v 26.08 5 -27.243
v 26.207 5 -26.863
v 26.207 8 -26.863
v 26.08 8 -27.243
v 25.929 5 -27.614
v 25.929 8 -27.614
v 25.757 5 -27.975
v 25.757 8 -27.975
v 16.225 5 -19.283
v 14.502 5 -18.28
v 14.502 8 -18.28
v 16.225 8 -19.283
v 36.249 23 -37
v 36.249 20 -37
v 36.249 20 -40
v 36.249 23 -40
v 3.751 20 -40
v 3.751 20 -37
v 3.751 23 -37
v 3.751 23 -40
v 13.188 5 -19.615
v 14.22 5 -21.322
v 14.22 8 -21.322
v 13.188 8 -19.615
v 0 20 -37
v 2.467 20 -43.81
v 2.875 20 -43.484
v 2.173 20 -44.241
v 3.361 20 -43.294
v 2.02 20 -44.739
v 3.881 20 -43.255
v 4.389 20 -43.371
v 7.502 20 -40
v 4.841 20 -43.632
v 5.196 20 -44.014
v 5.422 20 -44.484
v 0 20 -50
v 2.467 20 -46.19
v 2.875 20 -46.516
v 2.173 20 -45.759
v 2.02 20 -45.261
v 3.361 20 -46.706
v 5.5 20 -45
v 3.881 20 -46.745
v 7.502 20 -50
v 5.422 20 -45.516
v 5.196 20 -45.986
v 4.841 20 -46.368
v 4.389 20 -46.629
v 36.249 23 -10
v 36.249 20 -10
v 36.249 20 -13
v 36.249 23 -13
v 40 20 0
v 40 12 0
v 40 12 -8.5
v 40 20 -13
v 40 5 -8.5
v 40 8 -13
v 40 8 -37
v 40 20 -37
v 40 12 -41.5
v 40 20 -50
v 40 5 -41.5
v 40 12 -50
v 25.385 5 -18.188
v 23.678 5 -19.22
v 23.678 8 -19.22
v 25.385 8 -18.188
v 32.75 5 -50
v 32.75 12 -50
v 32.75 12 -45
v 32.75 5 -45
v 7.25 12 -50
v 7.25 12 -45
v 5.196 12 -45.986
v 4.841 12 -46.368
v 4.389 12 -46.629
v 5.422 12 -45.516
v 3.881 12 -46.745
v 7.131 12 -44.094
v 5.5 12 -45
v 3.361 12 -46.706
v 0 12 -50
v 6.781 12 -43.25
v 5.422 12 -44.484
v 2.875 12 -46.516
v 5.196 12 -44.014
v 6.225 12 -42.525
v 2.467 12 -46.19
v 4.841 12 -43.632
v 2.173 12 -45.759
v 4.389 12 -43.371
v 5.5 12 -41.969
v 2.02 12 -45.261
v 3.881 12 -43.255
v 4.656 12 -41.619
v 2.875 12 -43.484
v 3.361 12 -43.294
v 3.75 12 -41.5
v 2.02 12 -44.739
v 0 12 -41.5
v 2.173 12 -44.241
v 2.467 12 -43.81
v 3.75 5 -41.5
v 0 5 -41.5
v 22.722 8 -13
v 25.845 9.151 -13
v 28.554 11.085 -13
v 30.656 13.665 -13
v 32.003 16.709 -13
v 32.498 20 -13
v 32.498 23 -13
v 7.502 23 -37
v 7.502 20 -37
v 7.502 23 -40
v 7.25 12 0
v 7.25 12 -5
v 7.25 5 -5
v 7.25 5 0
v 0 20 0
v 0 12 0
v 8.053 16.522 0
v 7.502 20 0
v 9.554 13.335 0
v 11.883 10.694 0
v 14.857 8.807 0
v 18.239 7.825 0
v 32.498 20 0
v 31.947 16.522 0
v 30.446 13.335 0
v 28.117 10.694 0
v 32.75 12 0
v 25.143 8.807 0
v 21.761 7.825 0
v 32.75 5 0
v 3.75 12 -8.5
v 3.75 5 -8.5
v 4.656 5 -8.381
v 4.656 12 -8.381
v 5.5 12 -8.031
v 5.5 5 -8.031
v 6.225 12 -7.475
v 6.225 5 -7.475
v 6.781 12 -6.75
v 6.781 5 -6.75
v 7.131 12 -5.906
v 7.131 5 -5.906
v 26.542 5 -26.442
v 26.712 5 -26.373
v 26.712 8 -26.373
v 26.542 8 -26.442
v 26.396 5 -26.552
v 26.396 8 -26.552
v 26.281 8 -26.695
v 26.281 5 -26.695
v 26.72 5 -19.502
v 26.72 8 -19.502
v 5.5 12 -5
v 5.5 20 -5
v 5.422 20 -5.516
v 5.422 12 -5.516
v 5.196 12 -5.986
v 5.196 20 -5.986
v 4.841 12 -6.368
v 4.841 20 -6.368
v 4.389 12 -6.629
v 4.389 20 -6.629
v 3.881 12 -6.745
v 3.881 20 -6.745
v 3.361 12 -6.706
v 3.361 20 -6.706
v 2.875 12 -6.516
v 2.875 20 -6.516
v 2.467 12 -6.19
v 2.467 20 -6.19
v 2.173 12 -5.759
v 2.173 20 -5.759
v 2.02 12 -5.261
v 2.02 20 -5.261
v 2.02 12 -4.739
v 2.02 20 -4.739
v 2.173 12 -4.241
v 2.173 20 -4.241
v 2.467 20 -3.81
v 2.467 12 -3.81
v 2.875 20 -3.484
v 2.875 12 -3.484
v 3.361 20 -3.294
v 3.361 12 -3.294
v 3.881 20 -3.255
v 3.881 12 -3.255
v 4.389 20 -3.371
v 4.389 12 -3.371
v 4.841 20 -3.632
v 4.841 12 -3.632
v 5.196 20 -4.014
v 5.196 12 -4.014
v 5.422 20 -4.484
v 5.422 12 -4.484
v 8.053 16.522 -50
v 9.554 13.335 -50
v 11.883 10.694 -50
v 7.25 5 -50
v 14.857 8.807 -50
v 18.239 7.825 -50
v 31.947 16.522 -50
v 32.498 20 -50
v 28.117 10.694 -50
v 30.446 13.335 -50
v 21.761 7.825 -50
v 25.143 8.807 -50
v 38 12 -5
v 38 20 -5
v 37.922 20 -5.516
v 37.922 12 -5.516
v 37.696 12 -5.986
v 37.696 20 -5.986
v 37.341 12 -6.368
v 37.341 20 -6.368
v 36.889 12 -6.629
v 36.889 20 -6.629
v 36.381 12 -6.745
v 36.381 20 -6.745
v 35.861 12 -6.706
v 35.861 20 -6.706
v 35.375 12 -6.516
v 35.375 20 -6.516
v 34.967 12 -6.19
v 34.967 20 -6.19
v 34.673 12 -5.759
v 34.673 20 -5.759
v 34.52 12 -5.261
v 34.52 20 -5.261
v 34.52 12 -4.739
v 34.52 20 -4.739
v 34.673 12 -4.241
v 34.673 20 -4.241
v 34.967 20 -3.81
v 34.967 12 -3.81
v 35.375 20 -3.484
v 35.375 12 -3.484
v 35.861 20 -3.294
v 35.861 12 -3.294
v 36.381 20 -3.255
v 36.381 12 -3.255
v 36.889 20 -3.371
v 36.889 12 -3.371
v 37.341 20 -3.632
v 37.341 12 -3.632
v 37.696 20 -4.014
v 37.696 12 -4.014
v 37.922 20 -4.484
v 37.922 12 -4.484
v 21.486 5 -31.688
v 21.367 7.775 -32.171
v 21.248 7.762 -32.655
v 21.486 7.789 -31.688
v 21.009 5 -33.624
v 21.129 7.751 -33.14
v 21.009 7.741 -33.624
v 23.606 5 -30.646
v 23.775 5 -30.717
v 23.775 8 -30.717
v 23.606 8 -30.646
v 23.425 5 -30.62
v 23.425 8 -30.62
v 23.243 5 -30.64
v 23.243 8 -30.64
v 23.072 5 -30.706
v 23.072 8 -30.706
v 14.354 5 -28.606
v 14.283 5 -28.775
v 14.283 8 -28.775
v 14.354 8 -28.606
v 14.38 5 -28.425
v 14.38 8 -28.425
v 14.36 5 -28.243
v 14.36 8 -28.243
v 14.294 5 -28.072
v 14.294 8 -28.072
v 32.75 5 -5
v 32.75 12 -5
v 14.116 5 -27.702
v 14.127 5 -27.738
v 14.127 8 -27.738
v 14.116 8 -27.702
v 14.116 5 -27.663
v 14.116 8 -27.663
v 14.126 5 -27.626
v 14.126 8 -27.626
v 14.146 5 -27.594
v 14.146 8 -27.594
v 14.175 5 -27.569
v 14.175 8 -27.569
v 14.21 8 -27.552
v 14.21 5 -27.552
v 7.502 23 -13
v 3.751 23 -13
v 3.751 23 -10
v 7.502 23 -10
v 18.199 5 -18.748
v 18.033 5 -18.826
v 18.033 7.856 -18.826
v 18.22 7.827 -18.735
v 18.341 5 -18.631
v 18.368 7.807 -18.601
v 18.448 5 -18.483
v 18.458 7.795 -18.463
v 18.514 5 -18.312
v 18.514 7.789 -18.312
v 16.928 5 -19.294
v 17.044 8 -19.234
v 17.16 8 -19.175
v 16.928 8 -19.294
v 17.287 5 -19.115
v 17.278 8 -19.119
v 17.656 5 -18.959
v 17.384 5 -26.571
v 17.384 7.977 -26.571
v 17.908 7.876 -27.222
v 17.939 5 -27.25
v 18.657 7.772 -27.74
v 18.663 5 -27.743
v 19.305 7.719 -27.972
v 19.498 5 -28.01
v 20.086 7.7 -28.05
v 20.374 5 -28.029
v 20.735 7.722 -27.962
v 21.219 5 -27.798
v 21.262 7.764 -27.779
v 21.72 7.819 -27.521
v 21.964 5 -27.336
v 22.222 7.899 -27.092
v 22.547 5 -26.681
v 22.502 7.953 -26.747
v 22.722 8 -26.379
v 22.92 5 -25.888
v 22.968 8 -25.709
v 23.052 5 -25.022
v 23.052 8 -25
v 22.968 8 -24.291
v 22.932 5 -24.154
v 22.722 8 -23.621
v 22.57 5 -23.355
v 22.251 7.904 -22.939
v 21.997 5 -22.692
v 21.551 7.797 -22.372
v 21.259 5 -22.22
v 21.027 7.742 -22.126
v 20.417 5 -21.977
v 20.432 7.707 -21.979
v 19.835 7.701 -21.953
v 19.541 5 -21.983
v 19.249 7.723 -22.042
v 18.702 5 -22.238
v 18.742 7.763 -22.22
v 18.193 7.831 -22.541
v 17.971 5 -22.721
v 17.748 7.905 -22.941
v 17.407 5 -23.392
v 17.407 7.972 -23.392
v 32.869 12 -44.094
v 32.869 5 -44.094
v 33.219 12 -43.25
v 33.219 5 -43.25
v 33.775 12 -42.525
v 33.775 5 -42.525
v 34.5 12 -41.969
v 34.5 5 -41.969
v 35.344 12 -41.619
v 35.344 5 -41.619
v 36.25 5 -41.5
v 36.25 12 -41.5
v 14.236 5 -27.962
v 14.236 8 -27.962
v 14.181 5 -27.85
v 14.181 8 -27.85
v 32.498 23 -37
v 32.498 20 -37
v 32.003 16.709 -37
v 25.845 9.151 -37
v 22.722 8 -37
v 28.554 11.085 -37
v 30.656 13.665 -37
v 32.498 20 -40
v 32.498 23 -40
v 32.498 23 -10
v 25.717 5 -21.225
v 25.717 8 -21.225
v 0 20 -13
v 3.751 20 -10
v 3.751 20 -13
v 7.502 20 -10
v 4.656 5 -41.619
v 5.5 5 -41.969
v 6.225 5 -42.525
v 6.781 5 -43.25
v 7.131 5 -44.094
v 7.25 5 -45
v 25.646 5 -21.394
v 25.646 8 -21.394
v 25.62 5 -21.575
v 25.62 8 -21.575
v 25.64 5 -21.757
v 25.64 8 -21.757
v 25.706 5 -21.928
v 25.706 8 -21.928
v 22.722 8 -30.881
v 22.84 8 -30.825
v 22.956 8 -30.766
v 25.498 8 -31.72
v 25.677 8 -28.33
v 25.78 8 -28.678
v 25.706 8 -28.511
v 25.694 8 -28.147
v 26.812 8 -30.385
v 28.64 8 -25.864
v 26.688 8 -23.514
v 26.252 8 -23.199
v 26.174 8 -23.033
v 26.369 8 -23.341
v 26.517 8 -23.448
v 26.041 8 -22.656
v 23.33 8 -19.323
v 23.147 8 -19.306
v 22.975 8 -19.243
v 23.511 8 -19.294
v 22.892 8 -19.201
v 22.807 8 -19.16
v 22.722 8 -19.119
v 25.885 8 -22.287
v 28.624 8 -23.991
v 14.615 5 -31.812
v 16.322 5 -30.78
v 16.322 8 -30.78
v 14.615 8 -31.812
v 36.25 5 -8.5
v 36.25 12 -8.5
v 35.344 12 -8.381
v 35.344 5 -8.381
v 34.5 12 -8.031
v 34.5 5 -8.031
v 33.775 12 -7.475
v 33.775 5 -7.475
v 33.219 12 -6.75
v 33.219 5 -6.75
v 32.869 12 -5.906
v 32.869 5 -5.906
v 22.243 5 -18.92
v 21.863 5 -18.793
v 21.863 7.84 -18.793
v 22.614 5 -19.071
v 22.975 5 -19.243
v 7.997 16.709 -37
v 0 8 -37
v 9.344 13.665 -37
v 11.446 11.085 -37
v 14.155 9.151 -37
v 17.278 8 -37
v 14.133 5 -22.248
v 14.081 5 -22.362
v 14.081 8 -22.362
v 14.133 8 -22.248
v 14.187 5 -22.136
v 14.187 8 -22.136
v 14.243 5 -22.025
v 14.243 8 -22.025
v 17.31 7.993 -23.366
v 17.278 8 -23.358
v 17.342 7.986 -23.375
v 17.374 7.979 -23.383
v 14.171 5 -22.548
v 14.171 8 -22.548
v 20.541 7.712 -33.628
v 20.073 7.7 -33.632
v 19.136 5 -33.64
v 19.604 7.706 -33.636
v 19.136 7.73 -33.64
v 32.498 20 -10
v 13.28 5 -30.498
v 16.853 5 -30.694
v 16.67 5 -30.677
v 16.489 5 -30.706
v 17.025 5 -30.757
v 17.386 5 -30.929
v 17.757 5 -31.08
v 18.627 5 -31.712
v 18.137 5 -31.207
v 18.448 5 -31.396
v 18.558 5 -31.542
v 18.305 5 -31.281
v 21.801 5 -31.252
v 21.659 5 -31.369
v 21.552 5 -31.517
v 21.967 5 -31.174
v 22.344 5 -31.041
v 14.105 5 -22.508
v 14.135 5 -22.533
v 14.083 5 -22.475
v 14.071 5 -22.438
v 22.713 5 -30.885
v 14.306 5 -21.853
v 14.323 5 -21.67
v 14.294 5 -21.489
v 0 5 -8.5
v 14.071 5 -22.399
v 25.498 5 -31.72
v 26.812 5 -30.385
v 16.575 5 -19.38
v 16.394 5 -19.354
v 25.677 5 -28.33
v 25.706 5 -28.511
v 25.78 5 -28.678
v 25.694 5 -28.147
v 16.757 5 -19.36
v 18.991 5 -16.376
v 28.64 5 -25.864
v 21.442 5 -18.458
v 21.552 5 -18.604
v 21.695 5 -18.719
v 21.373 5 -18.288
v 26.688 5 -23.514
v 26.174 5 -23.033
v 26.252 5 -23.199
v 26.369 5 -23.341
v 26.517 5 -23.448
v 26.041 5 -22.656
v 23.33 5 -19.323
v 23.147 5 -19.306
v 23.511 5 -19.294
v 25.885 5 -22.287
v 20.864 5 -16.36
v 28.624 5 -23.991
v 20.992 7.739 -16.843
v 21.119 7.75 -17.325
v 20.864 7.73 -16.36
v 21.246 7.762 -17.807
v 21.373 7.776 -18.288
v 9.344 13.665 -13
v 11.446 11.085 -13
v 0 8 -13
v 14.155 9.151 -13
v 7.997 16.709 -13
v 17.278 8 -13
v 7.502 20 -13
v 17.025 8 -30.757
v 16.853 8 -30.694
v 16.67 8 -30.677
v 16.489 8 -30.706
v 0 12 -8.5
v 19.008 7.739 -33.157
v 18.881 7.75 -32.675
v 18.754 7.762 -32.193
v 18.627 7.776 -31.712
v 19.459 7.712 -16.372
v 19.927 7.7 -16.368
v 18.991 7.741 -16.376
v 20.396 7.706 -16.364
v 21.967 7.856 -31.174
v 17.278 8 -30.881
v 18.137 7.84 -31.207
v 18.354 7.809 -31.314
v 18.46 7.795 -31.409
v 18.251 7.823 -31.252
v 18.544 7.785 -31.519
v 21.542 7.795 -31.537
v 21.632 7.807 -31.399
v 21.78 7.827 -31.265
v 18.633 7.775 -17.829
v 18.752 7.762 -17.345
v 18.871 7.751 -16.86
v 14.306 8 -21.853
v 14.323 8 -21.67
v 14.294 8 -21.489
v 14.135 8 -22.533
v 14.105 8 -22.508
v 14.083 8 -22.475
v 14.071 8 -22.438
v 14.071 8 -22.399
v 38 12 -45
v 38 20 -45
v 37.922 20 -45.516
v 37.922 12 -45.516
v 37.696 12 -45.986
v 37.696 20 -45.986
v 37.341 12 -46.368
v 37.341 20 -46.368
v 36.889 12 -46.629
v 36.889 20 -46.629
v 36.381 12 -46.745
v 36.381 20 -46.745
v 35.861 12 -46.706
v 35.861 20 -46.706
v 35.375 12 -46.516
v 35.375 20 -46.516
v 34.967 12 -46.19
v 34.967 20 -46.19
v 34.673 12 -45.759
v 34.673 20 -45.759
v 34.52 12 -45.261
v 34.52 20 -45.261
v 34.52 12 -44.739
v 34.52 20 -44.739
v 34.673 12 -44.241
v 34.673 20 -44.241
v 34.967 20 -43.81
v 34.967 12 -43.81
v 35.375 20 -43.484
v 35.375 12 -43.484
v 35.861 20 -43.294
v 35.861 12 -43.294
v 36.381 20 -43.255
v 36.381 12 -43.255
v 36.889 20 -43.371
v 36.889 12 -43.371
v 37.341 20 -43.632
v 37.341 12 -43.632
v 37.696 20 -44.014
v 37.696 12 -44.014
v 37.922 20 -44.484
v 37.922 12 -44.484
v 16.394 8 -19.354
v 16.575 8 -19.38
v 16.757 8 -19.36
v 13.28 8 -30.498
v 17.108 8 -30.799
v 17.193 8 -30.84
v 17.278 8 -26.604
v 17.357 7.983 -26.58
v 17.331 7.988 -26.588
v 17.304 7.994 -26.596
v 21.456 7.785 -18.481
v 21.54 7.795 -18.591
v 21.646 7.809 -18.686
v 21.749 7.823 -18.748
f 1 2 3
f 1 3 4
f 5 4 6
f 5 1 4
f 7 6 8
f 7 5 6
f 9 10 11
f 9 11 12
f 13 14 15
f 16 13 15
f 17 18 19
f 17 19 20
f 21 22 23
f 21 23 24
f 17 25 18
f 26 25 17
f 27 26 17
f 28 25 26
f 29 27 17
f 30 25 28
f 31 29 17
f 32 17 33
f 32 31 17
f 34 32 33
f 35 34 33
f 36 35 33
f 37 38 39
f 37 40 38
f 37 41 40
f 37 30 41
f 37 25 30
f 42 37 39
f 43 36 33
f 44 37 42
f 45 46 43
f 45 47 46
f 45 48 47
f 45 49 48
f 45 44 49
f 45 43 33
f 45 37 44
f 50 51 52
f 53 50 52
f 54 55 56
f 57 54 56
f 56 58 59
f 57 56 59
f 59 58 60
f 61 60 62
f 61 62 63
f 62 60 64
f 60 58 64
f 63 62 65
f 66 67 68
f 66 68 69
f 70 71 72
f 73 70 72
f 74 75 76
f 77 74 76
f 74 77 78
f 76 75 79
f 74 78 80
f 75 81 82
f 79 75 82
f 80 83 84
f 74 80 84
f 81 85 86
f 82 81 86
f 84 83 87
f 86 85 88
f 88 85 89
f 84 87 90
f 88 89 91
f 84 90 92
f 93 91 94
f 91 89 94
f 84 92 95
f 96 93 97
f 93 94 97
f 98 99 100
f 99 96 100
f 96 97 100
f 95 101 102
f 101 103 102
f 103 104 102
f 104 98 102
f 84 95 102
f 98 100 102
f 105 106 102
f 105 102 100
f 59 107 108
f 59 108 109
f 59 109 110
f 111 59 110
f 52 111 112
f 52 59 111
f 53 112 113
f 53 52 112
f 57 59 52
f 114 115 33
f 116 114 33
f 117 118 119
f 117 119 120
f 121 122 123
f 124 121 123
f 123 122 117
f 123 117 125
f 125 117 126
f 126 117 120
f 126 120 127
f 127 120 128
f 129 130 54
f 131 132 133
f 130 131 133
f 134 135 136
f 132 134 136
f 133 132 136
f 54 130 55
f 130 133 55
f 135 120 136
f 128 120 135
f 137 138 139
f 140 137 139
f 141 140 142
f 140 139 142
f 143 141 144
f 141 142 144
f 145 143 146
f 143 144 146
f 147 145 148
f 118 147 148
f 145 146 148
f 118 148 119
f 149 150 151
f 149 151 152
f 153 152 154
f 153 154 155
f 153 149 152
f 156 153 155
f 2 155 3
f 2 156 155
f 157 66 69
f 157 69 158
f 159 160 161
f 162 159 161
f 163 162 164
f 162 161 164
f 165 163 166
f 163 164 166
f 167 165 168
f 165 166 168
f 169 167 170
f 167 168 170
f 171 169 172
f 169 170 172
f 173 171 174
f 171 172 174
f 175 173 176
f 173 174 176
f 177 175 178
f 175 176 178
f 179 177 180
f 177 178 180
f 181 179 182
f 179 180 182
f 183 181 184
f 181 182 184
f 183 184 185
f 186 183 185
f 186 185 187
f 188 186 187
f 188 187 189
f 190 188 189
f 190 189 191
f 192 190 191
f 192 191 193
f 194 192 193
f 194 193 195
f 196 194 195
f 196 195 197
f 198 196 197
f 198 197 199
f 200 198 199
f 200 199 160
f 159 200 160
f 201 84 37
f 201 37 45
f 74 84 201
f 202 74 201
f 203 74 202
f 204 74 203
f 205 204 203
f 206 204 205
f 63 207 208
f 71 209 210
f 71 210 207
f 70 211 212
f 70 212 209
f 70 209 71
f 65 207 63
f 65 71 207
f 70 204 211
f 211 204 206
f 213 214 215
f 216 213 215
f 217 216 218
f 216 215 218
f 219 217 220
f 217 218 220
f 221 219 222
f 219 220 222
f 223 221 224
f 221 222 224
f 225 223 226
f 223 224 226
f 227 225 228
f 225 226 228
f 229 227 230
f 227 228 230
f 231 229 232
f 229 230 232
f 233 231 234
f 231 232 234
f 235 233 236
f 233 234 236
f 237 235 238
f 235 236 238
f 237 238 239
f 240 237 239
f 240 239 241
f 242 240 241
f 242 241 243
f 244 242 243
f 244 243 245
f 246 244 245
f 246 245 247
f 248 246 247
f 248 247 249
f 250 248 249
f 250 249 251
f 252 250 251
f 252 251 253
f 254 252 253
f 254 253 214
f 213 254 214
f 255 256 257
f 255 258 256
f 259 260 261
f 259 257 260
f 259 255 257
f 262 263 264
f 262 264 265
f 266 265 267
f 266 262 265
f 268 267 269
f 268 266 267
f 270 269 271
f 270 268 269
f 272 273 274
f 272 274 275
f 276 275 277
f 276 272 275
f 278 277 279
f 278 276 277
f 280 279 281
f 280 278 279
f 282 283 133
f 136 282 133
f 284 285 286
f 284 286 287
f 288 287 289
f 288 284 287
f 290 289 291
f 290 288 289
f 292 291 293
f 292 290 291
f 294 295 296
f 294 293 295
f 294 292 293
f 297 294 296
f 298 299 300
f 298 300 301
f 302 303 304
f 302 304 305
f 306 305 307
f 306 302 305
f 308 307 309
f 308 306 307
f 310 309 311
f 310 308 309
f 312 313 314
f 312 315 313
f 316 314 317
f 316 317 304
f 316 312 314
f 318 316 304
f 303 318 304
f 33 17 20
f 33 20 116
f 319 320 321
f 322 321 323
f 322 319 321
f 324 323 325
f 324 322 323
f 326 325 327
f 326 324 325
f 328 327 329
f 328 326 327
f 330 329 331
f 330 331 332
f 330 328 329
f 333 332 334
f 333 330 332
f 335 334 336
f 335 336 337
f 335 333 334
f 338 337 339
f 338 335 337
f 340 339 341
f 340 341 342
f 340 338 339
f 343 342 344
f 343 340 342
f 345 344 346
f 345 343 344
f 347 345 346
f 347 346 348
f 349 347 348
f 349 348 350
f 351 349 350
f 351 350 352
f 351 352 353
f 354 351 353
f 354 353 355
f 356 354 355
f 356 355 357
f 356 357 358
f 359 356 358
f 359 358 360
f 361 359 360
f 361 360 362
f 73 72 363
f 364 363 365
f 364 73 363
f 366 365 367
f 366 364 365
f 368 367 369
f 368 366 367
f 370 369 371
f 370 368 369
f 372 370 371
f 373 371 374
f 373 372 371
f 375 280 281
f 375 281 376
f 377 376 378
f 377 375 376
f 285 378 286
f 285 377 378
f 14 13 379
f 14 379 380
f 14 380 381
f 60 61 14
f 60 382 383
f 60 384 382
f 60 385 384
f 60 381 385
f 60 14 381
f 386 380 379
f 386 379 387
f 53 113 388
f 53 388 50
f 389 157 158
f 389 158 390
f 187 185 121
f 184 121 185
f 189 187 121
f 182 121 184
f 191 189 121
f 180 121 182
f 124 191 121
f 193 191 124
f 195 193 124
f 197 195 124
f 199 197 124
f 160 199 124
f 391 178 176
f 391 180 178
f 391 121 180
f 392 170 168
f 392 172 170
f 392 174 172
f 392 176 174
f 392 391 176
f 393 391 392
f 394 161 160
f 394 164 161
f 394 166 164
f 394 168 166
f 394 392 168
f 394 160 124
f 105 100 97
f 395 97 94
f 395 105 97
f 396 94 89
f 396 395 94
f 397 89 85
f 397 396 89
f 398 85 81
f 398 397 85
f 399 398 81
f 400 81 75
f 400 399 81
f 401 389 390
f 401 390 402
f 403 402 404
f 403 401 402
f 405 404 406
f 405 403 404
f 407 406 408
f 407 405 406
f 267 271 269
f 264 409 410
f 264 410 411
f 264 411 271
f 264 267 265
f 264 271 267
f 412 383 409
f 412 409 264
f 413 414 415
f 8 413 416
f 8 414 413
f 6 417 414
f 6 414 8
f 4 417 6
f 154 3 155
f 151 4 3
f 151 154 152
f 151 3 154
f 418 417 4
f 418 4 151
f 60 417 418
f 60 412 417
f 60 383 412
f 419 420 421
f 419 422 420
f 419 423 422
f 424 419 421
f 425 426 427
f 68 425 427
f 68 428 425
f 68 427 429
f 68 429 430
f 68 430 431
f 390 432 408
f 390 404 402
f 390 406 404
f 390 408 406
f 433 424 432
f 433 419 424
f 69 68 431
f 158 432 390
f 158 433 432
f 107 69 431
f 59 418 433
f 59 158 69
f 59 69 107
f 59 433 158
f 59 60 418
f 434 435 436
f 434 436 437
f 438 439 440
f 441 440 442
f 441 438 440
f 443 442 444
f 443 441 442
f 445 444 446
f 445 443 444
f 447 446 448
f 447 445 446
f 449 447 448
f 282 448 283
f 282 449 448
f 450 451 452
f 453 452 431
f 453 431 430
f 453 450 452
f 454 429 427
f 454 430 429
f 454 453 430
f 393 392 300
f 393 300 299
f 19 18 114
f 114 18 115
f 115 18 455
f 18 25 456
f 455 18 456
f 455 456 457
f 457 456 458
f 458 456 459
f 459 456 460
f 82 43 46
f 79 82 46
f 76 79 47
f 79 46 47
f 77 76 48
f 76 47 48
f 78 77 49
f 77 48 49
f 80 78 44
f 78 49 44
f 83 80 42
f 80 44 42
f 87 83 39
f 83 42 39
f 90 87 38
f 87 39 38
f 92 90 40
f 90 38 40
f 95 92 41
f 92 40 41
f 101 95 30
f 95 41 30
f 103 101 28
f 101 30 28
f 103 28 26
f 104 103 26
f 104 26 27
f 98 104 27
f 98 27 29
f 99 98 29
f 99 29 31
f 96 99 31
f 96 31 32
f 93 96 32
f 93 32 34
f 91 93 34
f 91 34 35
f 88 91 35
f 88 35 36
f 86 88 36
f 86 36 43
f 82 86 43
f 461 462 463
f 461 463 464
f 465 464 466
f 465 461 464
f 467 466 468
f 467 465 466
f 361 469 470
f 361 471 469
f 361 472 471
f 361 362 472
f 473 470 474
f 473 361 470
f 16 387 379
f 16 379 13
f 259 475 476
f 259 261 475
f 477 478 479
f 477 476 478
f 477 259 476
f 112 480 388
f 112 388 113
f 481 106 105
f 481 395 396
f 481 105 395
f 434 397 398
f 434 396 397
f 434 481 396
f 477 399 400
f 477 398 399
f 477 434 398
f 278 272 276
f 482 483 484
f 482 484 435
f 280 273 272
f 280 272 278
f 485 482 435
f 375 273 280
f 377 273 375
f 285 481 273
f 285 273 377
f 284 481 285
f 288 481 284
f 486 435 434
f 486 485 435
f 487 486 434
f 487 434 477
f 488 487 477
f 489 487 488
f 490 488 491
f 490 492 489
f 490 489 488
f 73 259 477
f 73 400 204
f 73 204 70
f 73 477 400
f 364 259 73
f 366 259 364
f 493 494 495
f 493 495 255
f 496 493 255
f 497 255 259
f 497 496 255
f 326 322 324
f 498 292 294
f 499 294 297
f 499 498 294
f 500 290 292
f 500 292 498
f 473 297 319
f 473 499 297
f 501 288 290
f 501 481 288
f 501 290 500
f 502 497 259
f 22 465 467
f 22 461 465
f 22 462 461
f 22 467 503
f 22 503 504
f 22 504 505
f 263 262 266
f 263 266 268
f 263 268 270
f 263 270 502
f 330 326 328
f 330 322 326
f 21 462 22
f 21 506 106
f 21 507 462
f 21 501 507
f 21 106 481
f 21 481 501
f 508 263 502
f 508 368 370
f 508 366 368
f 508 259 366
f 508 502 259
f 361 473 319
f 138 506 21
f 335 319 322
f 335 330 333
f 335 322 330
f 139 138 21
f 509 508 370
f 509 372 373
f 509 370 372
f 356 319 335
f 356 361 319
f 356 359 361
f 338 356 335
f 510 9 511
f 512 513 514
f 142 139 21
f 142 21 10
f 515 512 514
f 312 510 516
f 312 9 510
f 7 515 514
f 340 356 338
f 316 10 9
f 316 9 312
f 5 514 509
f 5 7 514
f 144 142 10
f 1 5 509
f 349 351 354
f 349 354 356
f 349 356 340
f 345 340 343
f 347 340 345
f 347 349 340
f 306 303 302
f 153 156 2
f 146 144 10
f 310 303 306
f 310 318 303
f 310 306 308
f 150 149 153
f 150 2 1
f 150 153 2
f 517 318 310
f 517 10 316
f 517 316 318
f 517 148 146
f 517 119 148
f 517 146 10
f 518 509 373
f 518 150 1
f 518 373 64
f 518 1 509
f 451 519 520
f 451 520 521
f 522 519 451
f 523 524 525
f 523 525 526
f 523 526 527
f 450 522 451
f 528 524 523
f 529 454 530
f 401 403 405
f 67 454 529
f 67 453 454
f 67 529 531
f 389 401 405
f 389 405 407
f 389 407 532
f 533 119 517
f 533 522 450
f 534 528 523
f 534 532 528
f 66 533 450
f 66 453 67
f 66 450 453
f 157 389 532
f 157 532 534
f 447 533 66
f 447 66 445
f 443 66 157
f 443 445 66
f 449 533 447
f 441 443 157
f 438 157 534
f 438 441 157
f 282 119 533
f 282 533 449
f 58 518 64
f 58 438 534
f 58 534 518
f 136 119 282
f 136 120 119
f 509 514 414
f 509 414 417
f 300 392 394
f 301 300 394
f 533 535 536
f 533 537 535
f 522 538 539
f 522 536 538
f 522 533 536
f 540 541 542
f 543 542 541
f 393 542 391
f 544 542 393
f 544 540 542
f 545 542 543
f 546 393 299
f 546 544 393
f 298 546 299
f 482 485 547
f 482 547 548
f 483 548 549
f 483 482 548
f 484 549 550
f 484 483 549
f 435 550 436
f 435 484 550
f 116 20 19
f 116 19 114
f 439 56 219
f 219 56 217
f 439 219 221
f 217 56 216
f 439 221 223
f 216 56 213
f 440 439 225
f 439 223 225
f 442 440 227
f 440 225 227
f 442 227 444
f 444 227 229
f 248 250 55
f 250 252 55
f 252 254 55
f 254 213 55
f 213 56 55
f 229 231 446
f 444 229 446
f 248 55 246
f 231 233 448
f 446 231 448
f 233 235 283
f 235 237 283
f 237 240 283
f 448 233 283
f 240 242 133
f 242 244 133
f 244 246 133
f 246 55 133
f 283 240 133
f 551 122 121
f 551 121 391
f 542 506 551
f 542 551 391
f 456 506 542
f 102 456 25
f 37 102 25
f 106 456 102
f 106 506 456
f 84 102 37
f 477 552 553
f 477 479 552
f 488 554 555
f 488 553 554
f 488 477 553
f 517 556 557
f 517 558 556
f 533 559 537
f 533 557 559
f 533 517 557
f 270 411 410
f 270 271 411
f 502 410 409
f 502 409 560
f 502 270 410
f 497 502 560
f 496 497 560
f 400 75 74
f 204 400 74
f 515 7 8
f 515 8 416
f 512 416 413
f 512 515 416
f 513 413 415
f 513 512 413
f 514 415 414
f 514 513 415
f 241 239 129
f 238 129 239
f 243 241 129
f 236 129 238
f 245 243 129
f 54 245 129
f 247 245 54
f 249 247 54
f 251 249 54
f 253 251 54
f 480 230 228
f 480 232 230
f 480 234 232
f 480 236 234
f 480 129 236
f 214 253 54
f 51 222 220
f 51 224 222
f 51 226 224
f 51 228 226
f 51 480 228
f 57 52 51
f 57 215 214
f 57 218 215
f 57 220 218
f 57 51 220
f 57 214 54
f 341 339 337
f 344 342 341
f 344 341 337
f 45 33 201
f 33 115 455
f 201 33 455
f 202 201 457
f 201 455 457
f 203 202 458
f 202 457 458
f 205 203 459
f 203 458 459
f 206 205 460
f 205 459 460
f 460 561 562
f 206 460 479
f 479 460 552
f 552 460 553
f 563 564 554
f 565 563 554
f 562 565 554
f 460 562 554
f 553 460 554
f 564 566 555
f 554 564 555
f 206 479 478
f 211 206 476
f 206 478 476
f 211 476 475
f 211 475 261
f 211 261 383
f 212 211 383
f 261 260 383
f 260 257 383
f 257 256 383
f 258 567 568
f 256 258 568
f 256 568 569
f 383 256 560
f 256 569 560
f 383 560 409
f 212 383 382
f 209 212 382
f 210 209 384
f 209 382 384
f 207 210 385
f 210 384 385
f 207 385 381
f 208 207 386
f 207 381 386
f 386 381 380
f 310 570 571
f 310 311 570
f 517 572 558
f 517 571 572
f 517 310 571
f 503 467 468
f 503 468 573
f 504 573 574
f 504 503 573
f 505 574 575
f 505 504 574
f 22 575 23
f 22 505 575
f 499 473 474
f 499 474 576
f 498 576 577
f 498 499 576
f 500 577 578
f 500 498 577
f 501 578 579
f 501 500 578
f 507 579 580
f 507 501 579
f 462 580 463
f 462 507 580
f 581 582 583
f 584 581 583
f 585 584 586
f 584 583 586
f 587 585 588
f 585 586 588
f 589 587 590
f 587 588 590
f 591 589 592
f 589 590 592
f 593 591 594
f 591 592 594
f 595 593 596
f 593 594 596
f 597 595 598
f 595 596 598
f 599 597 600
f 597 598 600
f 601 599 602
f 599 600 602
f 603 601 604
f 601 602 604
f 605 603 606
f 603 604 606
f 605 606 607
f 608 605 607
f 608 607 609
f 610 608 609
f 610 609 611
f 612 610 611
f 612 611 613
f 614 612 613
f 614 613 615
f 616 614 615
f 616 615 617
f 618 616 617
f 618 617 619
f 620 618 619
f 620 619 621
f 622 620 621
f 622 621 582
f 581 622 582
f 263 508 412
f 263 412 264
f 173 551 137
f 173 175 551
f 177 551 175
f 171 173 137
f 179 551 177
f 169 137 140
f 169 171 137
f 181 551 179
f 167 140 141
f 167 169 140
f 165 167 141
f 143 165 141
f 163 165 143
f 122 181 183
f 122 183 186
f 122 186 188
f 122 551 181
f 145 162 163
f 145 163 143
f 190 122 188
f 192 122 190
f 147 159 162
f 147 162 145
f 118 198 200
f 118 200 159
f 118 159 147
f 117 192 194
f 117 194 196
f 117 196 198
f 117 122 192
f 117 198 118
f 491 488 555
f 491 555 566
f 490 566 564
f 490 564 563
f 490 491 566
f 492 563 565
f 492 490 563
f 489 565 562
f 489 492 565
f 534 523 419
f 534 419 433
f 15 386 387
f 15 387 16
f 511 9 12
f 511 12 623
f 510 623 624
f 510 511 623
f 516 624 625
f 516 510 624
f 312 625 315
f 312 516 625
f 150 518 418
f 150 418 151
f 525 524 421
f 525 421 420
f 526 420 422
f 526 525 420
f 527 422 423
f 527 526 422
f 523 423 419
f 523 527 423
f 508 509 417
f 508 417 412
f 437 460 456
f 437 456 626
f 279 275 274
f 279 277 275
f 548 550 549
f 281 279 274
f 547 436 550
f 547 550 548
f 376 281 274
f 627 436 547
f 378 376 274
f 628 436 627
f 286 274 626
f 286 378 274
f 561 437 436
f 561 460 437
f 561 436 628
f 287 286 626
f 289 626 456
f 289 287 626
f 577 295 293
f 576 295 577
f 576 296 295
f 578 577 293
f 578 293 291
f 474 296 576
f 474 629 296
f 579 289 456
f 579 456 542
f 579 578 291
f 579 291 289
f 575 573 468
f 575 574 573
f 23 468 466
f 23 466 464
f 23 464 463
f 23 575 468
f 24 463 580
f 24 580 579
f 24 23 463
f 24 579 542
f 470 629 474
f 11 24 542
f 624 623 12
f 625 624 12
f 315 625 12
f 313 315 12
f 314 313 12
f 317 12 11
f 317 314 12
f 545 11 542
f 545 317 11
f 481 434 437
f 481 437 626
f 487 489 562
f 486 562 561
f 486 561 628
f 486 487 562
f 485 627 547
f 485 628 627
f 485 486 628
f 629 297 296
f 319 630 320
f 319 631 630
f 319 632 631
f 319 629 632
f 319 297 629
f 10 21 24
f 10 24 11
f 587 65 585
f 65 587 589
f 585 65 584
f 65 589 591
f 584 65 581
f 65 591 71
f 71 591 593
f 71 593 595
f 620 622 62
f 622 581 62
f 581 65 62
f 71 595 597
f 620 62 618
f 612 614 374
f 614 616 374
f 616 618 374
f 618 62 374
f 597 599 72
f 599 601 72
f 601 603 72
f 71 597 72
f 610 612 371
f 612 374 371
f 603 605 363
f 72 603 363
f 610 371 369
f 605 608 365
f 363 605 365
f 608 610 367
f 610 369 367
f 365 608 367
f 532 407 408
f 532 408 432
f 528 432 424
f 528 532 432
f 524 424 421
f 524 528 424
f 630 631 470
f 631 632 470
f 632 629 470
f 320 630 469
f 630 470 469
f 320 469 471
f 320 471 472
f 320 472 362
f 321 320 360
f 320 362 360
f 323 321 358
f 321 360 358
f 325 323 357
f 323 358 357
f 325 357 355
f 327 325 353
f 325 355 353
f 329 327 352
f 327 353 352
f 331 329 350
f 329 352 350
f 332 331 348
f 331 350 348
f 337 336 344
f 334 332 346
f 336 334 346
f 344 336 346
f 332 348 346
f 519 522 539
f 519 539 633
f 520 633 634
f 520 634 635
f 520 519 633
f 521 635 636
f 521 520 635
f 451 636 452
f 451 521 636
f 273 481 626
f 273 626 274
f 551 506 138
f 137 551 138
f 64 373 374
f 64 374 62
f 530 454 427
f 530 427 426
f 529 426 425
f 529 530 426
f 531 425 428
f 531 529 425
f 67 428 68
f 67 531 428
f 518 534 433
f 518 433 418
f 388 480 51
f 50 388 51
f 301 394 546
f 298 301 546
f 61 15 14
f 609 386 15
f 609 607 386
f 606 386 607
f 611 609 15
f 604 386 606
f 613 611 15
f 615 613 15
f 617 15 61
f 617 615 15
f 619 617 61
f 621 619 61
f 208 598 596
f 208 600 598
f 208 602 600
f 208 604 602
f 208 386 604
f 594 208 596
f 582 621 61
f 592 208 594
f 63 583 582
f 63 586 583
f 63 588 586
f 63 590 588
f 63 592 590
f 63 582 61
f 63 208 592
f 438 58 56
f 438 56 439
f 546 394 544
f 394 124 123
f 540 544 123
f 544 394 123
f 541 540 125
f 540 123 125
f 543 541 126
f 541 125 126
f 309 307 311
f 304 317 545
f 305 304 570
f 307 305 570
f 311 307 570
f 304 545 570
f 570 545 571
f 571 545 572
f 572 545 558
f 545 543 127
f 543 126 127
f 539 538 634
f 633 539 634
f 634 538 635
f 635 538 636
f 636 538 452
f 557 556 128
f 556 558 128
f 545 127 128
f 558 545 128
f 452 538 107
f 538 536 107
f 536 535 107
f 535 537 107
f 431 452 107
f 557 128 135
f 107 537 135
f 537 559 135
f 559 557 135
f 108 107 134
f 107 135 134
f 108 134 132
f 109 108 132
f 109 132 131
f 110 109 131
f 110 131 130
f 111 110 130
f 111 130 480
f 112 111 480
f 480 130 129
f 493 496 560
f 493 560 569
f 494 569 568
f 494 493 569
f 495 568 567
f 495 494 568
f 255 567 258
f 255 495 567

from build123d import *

# Parameters (mm, degrees)
CROQUIS1_W              = 40
CROQUIS1_H              = 50
SALIENTE_EXTRUIR1_DEPTH = 20
CROQUIS2_R              = 12.5
CORTAR_EXTRUIR1_DEPTH   = 51
CROQUIS3_R              = 1.75
CORTAR_EXTRUIR2_DEPTH   = 21
CORTAR_EXTRUIR3_DEPTH   = 41
CROQUIS5_W              = 3.750800051
CROQUIS5_H              = 3
SALIENTE_EXTRUIR3_DEPTH = 3
CORTAR_EXTRUIR5_DEPTH   = 24
CORTAR_EXTRUIR6_DEPTH   = 12
CROQUIS8_W              = 40
CROQUIS8_H              = 50
CORTAR_EXTRUIR7_DEPTH   = 5


with BuildPart() as part:
    # Croquis1 → Saliente-Extruir1 (new body)
    with BuildSketch(Plane(origin=(0, 0, 0), x_dir=(1, 0, 0), z_dir=(0, 1, 0))):
        with Locations((20, 25)):
            Rectangle(CROQUIS1_W, CROQUIS1_H)
    extrude(amount=SALIENTE_EXTRUIR1_DEPTH)

    # Croquis2 → Cortar-Extruir1 (cut, through all)
    with BuildSketch(Plane.XY):
        with Locations((20, 20.2)):
            Circle(CROQUIS2_R)
    extrude(amount=-CORTAR_EXTRUIR1_DEPTH, mode=Mode.SUBTRACT)

    # Croquis3 → Cortar-Extruir2 (cut, through all)
    with BuildSketch(Plane(origin=(0, 20, 0), x_dir=(1, 0, 0), z_dir=(0, 1, 0))):
        with Locations((3.75, 45)):
            Circle(CROQUIS3_R)
        with Locations((36.25, 45)):
            Circle(CROQUIS3_R)
        with Locations((36.25, 5)):
            Circle(CROQUIS3_R)
        with Locations((3.75, 5)):
            Circle(CROQUIS3_R)
    extrude(amount=-CORTAR_EXTRUIR2_DEPTH, mode=Mode.SUBTRACT)

    # Croquis4 → Cortar-Extruir3 (cut, through all)
    with BuildSketch(Plane(origin=(40, 0, 0), x_dir=(0, 0, -1), z_dir=(1, 0, 0))):
        Polygon((25, 20), (37, 20), (37, 8), (13, 8), (13, 20), align=None)
    extrude(amount=-CORTAR_EXTRUIR3_DEPTH, mode=Mode.SUBTRACT)

    # Croquis5 → Saliente-Extruir3 (add)
    with BuildSketch(Plane(origin=(0, 20, 0), x_dir=(1, 0, 0), z_dir=(0, 1, 0))):
        with Locations((5.626200076, 38.5)):
            Rectangle(CROQUIS5_W, CROQUIS5_H)
        with Locations((34.373799924, 11.5)):
            Rectangle(CROQUIS5_W, CROQUIS5_H)
        with Locations((34.373799924, 38.5)):
            Rectangle(CROQUIS5_W, CROQUIS5_H)
        with Locations((5.626200076, 11.5)):
            Rectangle(CROQUIS5_W, CROQUIS5_H)
    extrude(amount=SALIENTE_EXTRUIR3_DEPTH)

    # Croquis6 → Cortar-Extruir5 (cut, through all)
    with BuildSketch(Plane.XZ):
        with BuildLine():
            Line((13.188139939, -19.615331161), (14.501537669, -18.279657152))
            Line((14.501537669, -18.279657152), (16.224863288, -19.28260268))
            ThreePointArc((16.224863288, -19.28260268), (16.575067996, -19.380217097), (16.928320792, -19.294284721))
            ThreePointArc((16.928320792, -19.294284721), (17.469957789, -19.034324312), (18.033343063, -18.825644933))
            ThreePointArc((18.033343063, -18.825644933), (18.340671144, -18.631425053), (18.513928995, -18.31181024))
            Line((18.513928995, -18.31181024), (18.990823409, -16.375751708))
            Line((18.990823409, -16.375751708), (20.864, -16.36))
            Line((20.864, -16.36), (21.373385647, -18.287764816))
            ThreePointArc((21.373385647, -18.287764816), (21.551993955, -18.604420755), (21.862544768, -18.793444837))
            ThreePointArc((21.862544768, -18.793444837), (22.429359729, -18.992620263), (22.975291881, -19.243435206))
            ThreePointArc((22.975291881, -19.243435206), (23.329939845, -19.323414782), (23.678453448, -19.219924782))
            Line((23.678453448, -19.219924782), (25.384668839, -18.188139939))
            Line((25.384668839, -18.188139939), (26.720342848, -19.501537669))
            Line((26.720342848, -19.501537669), (25.71739732, -21.224863288))
            ThreePointArc((25.71739732, -21.224863288), (25.619782903, -21.575067996), (25.705715279, -21.928320792))
            ThreePointArc((25.705715279, -21.928320792), (25.965675688, -22.469957789), (26.174355067, -23.033343063))
            ThreePointArc((26.174355067, -23.033343063), (26.368574947, -23.340671144), (26.68818976, -23.513928995))
            Line((26.68818976, -23.513928995), (28.624248292, -23.990823409))
            Line((28.624248292, -23.990823409), (28.64, -25.864))
            Line((28.64, -25.864), (26.712235184, -26.373385647))
            ThreePointArc((26.712235184, -26.373385647), (26.395579245, -26.551993955), (26.206555163, -26.862544768))
            ThreePointArc((26.206555163, -26.862544768), (26.007379737, -27.429359729), (25.756564794, -27.975291881))
            ThreePointArc((25.756564794, -27.975291881), (25.676585218, -28.329939845), (25.780075218, -28.678453448))
            Line((25.780075218, -28.678453448), (26.811860061, -30.384668839))
            Line((26.811860061, -30.384668839), (25.498462331, -31.720342848))
            Line((25.498462331, -31.720342848), (23.775136712, -30.71739732))
            ThreePointArc((23.775136712, -30.71739732), (23.424932004, -30.619782903), (23.071679208, -30.705715279))
            ThreePointArc((23.071679208, -30.705715279), (22.530042211, -30.965675688), (21.966656937, -31.174355067))
            ThreePointArc((21.966656937, -31.174355067), (21.659328856, -31.368574947), (21.486071005, -31.68818976))
            Line((21.486071005, -31.68818976), (21.009176591, -33.624248292))
            Line((21.009176591, -33.624248292), (19.136, -33.64))
            Line((19.136, -33.64), (18.626614353, -31.712235184))
            ThreePointArc((18.626614353, -31.712235184), (18.448006045, -31.395579245), (18.137455232, -31.206555163))
            ThreePointArc((18.137455232, -31.206555163), (17.570640271, -31.007379737), (17.024708119, -30.756564794))
            ThreePointArc((17.024708119, -30.756564794), (16.670060155, -30.676585218), (16.321546552, -30.780075218))
            Line((16.321546552, -30.780075218), (14.615331161, -31.811860061))
            Line((14.615331161, -31.811860061), (13.279657152, -30.498462331))
            Line((13.279657152, -30.498462331), (14.28260268, -28.775136712))
            ThreePointArc((14.28260268, -28.775136712), (14.380217097, -28.424932004), (14.294284721, -28.071679208))
            ThreePointArc((14.294284721, -28.071679208), (14.208247472, -27.906200724), (14.127008205, -27.738314697))
            ThreePointArc((14.127008205, -27.738314697), (14.125953752, -27.626452127), (14.209575503, -27.552143653))
            Line((14.209575503, -27.552143653), (17.384042323, -26.571445385))
            ThreePointArc((17.384042323, -26.571445385), (23.05159058, -25.021681648), (17.406635637, -23.391542216))
            Line((17.406635637, -23.391542216), (14.170602247, -22.54767412))
            ThreePointArc((14.170602247, -22.54767412), (14.082937198, -22.475491969), (14.08129489, -22.361945826))
            ThreePointArc((14.08129489, -22.361945826), (14.159930296, -22.19215637), (14.243435206, -22.024708119))
            ThreePointArc((14.243435206, -22.024708119), (14.323414782, -21.670060155), (14.219924782, -21.321546552))
            Line((14.219924782, -21.321546552), (13.188139939, -19.615331161))
        make_face()
    extrude(amount=-CORTAR_EXTRUIR5_DEPTH, mode=Mode.SUBTRACT)

    # Croquis7 → Cortar-Extruir6 (cut)
    with BuildSketch(Plane.XZ):
        with BuildLine():
            Line((7.25, -5), (7.25, 0))
            Line((7.25, 0), (0, 0))
            Line((0, 0), (0, -8.5))
            Line((0, -8.5), (3.75, -8.5))
            ThreePointArc((3.75, -8.5), (6.224873734, -7.474873734), (7.25, -5))
        make_face()
        with BuildLine():
            Line((32.75, -5), (32.75, 0))
            Line((32.75, 0), (40, 0))
            Line((40, 0), (40, -8.5))
            Line((40, -8.5), (36.25, -8.5))
            ThreePointArc((36.25, -8.5), (33.775126266, -7.474873734), (32.75, -5))
        make_face()
        with BuildLine():
            Line((36.25, -41.5), (40, -41.5))
            Line((40, -41.5), (40, -50))
            Line((40, -50), (32.75, -50))
            Line((32.75, -50), (32.75, -45))
            ThreePointArc((32.75, -45), (33.775126266, -42.525126266), (36.25, -41.5))
        make_face()
        with BuildLine():
            Line((7.25, -45), (7.25, -50))
            Line((7.25, -50), (0, -50))
            Line((0, -50), (0, -41.5))
            Line((0, -41.5), (3.75, -41.5))
            ThreePointArc((3.75, -41.5), (6.224873734, -42.525126266), (7.25, -45))
        make_face()
    extrude(amount=-CORTAR_EXTRUIR6_DEPTH, mode=Mode.SUBTRACT)

    # Croquis8 → Cortar-Extruir7 (cut)
    with BuildSketch(Plane.XZ):
        with Locations((20, -25)):
            Rectangle(CROQUIS8_W, CROQUIS8_H)
    extrude(amount=-CORTAR_EXTRUIR7_DEPTH, mode=Mode.SUBTRACT)


solid = part.part
